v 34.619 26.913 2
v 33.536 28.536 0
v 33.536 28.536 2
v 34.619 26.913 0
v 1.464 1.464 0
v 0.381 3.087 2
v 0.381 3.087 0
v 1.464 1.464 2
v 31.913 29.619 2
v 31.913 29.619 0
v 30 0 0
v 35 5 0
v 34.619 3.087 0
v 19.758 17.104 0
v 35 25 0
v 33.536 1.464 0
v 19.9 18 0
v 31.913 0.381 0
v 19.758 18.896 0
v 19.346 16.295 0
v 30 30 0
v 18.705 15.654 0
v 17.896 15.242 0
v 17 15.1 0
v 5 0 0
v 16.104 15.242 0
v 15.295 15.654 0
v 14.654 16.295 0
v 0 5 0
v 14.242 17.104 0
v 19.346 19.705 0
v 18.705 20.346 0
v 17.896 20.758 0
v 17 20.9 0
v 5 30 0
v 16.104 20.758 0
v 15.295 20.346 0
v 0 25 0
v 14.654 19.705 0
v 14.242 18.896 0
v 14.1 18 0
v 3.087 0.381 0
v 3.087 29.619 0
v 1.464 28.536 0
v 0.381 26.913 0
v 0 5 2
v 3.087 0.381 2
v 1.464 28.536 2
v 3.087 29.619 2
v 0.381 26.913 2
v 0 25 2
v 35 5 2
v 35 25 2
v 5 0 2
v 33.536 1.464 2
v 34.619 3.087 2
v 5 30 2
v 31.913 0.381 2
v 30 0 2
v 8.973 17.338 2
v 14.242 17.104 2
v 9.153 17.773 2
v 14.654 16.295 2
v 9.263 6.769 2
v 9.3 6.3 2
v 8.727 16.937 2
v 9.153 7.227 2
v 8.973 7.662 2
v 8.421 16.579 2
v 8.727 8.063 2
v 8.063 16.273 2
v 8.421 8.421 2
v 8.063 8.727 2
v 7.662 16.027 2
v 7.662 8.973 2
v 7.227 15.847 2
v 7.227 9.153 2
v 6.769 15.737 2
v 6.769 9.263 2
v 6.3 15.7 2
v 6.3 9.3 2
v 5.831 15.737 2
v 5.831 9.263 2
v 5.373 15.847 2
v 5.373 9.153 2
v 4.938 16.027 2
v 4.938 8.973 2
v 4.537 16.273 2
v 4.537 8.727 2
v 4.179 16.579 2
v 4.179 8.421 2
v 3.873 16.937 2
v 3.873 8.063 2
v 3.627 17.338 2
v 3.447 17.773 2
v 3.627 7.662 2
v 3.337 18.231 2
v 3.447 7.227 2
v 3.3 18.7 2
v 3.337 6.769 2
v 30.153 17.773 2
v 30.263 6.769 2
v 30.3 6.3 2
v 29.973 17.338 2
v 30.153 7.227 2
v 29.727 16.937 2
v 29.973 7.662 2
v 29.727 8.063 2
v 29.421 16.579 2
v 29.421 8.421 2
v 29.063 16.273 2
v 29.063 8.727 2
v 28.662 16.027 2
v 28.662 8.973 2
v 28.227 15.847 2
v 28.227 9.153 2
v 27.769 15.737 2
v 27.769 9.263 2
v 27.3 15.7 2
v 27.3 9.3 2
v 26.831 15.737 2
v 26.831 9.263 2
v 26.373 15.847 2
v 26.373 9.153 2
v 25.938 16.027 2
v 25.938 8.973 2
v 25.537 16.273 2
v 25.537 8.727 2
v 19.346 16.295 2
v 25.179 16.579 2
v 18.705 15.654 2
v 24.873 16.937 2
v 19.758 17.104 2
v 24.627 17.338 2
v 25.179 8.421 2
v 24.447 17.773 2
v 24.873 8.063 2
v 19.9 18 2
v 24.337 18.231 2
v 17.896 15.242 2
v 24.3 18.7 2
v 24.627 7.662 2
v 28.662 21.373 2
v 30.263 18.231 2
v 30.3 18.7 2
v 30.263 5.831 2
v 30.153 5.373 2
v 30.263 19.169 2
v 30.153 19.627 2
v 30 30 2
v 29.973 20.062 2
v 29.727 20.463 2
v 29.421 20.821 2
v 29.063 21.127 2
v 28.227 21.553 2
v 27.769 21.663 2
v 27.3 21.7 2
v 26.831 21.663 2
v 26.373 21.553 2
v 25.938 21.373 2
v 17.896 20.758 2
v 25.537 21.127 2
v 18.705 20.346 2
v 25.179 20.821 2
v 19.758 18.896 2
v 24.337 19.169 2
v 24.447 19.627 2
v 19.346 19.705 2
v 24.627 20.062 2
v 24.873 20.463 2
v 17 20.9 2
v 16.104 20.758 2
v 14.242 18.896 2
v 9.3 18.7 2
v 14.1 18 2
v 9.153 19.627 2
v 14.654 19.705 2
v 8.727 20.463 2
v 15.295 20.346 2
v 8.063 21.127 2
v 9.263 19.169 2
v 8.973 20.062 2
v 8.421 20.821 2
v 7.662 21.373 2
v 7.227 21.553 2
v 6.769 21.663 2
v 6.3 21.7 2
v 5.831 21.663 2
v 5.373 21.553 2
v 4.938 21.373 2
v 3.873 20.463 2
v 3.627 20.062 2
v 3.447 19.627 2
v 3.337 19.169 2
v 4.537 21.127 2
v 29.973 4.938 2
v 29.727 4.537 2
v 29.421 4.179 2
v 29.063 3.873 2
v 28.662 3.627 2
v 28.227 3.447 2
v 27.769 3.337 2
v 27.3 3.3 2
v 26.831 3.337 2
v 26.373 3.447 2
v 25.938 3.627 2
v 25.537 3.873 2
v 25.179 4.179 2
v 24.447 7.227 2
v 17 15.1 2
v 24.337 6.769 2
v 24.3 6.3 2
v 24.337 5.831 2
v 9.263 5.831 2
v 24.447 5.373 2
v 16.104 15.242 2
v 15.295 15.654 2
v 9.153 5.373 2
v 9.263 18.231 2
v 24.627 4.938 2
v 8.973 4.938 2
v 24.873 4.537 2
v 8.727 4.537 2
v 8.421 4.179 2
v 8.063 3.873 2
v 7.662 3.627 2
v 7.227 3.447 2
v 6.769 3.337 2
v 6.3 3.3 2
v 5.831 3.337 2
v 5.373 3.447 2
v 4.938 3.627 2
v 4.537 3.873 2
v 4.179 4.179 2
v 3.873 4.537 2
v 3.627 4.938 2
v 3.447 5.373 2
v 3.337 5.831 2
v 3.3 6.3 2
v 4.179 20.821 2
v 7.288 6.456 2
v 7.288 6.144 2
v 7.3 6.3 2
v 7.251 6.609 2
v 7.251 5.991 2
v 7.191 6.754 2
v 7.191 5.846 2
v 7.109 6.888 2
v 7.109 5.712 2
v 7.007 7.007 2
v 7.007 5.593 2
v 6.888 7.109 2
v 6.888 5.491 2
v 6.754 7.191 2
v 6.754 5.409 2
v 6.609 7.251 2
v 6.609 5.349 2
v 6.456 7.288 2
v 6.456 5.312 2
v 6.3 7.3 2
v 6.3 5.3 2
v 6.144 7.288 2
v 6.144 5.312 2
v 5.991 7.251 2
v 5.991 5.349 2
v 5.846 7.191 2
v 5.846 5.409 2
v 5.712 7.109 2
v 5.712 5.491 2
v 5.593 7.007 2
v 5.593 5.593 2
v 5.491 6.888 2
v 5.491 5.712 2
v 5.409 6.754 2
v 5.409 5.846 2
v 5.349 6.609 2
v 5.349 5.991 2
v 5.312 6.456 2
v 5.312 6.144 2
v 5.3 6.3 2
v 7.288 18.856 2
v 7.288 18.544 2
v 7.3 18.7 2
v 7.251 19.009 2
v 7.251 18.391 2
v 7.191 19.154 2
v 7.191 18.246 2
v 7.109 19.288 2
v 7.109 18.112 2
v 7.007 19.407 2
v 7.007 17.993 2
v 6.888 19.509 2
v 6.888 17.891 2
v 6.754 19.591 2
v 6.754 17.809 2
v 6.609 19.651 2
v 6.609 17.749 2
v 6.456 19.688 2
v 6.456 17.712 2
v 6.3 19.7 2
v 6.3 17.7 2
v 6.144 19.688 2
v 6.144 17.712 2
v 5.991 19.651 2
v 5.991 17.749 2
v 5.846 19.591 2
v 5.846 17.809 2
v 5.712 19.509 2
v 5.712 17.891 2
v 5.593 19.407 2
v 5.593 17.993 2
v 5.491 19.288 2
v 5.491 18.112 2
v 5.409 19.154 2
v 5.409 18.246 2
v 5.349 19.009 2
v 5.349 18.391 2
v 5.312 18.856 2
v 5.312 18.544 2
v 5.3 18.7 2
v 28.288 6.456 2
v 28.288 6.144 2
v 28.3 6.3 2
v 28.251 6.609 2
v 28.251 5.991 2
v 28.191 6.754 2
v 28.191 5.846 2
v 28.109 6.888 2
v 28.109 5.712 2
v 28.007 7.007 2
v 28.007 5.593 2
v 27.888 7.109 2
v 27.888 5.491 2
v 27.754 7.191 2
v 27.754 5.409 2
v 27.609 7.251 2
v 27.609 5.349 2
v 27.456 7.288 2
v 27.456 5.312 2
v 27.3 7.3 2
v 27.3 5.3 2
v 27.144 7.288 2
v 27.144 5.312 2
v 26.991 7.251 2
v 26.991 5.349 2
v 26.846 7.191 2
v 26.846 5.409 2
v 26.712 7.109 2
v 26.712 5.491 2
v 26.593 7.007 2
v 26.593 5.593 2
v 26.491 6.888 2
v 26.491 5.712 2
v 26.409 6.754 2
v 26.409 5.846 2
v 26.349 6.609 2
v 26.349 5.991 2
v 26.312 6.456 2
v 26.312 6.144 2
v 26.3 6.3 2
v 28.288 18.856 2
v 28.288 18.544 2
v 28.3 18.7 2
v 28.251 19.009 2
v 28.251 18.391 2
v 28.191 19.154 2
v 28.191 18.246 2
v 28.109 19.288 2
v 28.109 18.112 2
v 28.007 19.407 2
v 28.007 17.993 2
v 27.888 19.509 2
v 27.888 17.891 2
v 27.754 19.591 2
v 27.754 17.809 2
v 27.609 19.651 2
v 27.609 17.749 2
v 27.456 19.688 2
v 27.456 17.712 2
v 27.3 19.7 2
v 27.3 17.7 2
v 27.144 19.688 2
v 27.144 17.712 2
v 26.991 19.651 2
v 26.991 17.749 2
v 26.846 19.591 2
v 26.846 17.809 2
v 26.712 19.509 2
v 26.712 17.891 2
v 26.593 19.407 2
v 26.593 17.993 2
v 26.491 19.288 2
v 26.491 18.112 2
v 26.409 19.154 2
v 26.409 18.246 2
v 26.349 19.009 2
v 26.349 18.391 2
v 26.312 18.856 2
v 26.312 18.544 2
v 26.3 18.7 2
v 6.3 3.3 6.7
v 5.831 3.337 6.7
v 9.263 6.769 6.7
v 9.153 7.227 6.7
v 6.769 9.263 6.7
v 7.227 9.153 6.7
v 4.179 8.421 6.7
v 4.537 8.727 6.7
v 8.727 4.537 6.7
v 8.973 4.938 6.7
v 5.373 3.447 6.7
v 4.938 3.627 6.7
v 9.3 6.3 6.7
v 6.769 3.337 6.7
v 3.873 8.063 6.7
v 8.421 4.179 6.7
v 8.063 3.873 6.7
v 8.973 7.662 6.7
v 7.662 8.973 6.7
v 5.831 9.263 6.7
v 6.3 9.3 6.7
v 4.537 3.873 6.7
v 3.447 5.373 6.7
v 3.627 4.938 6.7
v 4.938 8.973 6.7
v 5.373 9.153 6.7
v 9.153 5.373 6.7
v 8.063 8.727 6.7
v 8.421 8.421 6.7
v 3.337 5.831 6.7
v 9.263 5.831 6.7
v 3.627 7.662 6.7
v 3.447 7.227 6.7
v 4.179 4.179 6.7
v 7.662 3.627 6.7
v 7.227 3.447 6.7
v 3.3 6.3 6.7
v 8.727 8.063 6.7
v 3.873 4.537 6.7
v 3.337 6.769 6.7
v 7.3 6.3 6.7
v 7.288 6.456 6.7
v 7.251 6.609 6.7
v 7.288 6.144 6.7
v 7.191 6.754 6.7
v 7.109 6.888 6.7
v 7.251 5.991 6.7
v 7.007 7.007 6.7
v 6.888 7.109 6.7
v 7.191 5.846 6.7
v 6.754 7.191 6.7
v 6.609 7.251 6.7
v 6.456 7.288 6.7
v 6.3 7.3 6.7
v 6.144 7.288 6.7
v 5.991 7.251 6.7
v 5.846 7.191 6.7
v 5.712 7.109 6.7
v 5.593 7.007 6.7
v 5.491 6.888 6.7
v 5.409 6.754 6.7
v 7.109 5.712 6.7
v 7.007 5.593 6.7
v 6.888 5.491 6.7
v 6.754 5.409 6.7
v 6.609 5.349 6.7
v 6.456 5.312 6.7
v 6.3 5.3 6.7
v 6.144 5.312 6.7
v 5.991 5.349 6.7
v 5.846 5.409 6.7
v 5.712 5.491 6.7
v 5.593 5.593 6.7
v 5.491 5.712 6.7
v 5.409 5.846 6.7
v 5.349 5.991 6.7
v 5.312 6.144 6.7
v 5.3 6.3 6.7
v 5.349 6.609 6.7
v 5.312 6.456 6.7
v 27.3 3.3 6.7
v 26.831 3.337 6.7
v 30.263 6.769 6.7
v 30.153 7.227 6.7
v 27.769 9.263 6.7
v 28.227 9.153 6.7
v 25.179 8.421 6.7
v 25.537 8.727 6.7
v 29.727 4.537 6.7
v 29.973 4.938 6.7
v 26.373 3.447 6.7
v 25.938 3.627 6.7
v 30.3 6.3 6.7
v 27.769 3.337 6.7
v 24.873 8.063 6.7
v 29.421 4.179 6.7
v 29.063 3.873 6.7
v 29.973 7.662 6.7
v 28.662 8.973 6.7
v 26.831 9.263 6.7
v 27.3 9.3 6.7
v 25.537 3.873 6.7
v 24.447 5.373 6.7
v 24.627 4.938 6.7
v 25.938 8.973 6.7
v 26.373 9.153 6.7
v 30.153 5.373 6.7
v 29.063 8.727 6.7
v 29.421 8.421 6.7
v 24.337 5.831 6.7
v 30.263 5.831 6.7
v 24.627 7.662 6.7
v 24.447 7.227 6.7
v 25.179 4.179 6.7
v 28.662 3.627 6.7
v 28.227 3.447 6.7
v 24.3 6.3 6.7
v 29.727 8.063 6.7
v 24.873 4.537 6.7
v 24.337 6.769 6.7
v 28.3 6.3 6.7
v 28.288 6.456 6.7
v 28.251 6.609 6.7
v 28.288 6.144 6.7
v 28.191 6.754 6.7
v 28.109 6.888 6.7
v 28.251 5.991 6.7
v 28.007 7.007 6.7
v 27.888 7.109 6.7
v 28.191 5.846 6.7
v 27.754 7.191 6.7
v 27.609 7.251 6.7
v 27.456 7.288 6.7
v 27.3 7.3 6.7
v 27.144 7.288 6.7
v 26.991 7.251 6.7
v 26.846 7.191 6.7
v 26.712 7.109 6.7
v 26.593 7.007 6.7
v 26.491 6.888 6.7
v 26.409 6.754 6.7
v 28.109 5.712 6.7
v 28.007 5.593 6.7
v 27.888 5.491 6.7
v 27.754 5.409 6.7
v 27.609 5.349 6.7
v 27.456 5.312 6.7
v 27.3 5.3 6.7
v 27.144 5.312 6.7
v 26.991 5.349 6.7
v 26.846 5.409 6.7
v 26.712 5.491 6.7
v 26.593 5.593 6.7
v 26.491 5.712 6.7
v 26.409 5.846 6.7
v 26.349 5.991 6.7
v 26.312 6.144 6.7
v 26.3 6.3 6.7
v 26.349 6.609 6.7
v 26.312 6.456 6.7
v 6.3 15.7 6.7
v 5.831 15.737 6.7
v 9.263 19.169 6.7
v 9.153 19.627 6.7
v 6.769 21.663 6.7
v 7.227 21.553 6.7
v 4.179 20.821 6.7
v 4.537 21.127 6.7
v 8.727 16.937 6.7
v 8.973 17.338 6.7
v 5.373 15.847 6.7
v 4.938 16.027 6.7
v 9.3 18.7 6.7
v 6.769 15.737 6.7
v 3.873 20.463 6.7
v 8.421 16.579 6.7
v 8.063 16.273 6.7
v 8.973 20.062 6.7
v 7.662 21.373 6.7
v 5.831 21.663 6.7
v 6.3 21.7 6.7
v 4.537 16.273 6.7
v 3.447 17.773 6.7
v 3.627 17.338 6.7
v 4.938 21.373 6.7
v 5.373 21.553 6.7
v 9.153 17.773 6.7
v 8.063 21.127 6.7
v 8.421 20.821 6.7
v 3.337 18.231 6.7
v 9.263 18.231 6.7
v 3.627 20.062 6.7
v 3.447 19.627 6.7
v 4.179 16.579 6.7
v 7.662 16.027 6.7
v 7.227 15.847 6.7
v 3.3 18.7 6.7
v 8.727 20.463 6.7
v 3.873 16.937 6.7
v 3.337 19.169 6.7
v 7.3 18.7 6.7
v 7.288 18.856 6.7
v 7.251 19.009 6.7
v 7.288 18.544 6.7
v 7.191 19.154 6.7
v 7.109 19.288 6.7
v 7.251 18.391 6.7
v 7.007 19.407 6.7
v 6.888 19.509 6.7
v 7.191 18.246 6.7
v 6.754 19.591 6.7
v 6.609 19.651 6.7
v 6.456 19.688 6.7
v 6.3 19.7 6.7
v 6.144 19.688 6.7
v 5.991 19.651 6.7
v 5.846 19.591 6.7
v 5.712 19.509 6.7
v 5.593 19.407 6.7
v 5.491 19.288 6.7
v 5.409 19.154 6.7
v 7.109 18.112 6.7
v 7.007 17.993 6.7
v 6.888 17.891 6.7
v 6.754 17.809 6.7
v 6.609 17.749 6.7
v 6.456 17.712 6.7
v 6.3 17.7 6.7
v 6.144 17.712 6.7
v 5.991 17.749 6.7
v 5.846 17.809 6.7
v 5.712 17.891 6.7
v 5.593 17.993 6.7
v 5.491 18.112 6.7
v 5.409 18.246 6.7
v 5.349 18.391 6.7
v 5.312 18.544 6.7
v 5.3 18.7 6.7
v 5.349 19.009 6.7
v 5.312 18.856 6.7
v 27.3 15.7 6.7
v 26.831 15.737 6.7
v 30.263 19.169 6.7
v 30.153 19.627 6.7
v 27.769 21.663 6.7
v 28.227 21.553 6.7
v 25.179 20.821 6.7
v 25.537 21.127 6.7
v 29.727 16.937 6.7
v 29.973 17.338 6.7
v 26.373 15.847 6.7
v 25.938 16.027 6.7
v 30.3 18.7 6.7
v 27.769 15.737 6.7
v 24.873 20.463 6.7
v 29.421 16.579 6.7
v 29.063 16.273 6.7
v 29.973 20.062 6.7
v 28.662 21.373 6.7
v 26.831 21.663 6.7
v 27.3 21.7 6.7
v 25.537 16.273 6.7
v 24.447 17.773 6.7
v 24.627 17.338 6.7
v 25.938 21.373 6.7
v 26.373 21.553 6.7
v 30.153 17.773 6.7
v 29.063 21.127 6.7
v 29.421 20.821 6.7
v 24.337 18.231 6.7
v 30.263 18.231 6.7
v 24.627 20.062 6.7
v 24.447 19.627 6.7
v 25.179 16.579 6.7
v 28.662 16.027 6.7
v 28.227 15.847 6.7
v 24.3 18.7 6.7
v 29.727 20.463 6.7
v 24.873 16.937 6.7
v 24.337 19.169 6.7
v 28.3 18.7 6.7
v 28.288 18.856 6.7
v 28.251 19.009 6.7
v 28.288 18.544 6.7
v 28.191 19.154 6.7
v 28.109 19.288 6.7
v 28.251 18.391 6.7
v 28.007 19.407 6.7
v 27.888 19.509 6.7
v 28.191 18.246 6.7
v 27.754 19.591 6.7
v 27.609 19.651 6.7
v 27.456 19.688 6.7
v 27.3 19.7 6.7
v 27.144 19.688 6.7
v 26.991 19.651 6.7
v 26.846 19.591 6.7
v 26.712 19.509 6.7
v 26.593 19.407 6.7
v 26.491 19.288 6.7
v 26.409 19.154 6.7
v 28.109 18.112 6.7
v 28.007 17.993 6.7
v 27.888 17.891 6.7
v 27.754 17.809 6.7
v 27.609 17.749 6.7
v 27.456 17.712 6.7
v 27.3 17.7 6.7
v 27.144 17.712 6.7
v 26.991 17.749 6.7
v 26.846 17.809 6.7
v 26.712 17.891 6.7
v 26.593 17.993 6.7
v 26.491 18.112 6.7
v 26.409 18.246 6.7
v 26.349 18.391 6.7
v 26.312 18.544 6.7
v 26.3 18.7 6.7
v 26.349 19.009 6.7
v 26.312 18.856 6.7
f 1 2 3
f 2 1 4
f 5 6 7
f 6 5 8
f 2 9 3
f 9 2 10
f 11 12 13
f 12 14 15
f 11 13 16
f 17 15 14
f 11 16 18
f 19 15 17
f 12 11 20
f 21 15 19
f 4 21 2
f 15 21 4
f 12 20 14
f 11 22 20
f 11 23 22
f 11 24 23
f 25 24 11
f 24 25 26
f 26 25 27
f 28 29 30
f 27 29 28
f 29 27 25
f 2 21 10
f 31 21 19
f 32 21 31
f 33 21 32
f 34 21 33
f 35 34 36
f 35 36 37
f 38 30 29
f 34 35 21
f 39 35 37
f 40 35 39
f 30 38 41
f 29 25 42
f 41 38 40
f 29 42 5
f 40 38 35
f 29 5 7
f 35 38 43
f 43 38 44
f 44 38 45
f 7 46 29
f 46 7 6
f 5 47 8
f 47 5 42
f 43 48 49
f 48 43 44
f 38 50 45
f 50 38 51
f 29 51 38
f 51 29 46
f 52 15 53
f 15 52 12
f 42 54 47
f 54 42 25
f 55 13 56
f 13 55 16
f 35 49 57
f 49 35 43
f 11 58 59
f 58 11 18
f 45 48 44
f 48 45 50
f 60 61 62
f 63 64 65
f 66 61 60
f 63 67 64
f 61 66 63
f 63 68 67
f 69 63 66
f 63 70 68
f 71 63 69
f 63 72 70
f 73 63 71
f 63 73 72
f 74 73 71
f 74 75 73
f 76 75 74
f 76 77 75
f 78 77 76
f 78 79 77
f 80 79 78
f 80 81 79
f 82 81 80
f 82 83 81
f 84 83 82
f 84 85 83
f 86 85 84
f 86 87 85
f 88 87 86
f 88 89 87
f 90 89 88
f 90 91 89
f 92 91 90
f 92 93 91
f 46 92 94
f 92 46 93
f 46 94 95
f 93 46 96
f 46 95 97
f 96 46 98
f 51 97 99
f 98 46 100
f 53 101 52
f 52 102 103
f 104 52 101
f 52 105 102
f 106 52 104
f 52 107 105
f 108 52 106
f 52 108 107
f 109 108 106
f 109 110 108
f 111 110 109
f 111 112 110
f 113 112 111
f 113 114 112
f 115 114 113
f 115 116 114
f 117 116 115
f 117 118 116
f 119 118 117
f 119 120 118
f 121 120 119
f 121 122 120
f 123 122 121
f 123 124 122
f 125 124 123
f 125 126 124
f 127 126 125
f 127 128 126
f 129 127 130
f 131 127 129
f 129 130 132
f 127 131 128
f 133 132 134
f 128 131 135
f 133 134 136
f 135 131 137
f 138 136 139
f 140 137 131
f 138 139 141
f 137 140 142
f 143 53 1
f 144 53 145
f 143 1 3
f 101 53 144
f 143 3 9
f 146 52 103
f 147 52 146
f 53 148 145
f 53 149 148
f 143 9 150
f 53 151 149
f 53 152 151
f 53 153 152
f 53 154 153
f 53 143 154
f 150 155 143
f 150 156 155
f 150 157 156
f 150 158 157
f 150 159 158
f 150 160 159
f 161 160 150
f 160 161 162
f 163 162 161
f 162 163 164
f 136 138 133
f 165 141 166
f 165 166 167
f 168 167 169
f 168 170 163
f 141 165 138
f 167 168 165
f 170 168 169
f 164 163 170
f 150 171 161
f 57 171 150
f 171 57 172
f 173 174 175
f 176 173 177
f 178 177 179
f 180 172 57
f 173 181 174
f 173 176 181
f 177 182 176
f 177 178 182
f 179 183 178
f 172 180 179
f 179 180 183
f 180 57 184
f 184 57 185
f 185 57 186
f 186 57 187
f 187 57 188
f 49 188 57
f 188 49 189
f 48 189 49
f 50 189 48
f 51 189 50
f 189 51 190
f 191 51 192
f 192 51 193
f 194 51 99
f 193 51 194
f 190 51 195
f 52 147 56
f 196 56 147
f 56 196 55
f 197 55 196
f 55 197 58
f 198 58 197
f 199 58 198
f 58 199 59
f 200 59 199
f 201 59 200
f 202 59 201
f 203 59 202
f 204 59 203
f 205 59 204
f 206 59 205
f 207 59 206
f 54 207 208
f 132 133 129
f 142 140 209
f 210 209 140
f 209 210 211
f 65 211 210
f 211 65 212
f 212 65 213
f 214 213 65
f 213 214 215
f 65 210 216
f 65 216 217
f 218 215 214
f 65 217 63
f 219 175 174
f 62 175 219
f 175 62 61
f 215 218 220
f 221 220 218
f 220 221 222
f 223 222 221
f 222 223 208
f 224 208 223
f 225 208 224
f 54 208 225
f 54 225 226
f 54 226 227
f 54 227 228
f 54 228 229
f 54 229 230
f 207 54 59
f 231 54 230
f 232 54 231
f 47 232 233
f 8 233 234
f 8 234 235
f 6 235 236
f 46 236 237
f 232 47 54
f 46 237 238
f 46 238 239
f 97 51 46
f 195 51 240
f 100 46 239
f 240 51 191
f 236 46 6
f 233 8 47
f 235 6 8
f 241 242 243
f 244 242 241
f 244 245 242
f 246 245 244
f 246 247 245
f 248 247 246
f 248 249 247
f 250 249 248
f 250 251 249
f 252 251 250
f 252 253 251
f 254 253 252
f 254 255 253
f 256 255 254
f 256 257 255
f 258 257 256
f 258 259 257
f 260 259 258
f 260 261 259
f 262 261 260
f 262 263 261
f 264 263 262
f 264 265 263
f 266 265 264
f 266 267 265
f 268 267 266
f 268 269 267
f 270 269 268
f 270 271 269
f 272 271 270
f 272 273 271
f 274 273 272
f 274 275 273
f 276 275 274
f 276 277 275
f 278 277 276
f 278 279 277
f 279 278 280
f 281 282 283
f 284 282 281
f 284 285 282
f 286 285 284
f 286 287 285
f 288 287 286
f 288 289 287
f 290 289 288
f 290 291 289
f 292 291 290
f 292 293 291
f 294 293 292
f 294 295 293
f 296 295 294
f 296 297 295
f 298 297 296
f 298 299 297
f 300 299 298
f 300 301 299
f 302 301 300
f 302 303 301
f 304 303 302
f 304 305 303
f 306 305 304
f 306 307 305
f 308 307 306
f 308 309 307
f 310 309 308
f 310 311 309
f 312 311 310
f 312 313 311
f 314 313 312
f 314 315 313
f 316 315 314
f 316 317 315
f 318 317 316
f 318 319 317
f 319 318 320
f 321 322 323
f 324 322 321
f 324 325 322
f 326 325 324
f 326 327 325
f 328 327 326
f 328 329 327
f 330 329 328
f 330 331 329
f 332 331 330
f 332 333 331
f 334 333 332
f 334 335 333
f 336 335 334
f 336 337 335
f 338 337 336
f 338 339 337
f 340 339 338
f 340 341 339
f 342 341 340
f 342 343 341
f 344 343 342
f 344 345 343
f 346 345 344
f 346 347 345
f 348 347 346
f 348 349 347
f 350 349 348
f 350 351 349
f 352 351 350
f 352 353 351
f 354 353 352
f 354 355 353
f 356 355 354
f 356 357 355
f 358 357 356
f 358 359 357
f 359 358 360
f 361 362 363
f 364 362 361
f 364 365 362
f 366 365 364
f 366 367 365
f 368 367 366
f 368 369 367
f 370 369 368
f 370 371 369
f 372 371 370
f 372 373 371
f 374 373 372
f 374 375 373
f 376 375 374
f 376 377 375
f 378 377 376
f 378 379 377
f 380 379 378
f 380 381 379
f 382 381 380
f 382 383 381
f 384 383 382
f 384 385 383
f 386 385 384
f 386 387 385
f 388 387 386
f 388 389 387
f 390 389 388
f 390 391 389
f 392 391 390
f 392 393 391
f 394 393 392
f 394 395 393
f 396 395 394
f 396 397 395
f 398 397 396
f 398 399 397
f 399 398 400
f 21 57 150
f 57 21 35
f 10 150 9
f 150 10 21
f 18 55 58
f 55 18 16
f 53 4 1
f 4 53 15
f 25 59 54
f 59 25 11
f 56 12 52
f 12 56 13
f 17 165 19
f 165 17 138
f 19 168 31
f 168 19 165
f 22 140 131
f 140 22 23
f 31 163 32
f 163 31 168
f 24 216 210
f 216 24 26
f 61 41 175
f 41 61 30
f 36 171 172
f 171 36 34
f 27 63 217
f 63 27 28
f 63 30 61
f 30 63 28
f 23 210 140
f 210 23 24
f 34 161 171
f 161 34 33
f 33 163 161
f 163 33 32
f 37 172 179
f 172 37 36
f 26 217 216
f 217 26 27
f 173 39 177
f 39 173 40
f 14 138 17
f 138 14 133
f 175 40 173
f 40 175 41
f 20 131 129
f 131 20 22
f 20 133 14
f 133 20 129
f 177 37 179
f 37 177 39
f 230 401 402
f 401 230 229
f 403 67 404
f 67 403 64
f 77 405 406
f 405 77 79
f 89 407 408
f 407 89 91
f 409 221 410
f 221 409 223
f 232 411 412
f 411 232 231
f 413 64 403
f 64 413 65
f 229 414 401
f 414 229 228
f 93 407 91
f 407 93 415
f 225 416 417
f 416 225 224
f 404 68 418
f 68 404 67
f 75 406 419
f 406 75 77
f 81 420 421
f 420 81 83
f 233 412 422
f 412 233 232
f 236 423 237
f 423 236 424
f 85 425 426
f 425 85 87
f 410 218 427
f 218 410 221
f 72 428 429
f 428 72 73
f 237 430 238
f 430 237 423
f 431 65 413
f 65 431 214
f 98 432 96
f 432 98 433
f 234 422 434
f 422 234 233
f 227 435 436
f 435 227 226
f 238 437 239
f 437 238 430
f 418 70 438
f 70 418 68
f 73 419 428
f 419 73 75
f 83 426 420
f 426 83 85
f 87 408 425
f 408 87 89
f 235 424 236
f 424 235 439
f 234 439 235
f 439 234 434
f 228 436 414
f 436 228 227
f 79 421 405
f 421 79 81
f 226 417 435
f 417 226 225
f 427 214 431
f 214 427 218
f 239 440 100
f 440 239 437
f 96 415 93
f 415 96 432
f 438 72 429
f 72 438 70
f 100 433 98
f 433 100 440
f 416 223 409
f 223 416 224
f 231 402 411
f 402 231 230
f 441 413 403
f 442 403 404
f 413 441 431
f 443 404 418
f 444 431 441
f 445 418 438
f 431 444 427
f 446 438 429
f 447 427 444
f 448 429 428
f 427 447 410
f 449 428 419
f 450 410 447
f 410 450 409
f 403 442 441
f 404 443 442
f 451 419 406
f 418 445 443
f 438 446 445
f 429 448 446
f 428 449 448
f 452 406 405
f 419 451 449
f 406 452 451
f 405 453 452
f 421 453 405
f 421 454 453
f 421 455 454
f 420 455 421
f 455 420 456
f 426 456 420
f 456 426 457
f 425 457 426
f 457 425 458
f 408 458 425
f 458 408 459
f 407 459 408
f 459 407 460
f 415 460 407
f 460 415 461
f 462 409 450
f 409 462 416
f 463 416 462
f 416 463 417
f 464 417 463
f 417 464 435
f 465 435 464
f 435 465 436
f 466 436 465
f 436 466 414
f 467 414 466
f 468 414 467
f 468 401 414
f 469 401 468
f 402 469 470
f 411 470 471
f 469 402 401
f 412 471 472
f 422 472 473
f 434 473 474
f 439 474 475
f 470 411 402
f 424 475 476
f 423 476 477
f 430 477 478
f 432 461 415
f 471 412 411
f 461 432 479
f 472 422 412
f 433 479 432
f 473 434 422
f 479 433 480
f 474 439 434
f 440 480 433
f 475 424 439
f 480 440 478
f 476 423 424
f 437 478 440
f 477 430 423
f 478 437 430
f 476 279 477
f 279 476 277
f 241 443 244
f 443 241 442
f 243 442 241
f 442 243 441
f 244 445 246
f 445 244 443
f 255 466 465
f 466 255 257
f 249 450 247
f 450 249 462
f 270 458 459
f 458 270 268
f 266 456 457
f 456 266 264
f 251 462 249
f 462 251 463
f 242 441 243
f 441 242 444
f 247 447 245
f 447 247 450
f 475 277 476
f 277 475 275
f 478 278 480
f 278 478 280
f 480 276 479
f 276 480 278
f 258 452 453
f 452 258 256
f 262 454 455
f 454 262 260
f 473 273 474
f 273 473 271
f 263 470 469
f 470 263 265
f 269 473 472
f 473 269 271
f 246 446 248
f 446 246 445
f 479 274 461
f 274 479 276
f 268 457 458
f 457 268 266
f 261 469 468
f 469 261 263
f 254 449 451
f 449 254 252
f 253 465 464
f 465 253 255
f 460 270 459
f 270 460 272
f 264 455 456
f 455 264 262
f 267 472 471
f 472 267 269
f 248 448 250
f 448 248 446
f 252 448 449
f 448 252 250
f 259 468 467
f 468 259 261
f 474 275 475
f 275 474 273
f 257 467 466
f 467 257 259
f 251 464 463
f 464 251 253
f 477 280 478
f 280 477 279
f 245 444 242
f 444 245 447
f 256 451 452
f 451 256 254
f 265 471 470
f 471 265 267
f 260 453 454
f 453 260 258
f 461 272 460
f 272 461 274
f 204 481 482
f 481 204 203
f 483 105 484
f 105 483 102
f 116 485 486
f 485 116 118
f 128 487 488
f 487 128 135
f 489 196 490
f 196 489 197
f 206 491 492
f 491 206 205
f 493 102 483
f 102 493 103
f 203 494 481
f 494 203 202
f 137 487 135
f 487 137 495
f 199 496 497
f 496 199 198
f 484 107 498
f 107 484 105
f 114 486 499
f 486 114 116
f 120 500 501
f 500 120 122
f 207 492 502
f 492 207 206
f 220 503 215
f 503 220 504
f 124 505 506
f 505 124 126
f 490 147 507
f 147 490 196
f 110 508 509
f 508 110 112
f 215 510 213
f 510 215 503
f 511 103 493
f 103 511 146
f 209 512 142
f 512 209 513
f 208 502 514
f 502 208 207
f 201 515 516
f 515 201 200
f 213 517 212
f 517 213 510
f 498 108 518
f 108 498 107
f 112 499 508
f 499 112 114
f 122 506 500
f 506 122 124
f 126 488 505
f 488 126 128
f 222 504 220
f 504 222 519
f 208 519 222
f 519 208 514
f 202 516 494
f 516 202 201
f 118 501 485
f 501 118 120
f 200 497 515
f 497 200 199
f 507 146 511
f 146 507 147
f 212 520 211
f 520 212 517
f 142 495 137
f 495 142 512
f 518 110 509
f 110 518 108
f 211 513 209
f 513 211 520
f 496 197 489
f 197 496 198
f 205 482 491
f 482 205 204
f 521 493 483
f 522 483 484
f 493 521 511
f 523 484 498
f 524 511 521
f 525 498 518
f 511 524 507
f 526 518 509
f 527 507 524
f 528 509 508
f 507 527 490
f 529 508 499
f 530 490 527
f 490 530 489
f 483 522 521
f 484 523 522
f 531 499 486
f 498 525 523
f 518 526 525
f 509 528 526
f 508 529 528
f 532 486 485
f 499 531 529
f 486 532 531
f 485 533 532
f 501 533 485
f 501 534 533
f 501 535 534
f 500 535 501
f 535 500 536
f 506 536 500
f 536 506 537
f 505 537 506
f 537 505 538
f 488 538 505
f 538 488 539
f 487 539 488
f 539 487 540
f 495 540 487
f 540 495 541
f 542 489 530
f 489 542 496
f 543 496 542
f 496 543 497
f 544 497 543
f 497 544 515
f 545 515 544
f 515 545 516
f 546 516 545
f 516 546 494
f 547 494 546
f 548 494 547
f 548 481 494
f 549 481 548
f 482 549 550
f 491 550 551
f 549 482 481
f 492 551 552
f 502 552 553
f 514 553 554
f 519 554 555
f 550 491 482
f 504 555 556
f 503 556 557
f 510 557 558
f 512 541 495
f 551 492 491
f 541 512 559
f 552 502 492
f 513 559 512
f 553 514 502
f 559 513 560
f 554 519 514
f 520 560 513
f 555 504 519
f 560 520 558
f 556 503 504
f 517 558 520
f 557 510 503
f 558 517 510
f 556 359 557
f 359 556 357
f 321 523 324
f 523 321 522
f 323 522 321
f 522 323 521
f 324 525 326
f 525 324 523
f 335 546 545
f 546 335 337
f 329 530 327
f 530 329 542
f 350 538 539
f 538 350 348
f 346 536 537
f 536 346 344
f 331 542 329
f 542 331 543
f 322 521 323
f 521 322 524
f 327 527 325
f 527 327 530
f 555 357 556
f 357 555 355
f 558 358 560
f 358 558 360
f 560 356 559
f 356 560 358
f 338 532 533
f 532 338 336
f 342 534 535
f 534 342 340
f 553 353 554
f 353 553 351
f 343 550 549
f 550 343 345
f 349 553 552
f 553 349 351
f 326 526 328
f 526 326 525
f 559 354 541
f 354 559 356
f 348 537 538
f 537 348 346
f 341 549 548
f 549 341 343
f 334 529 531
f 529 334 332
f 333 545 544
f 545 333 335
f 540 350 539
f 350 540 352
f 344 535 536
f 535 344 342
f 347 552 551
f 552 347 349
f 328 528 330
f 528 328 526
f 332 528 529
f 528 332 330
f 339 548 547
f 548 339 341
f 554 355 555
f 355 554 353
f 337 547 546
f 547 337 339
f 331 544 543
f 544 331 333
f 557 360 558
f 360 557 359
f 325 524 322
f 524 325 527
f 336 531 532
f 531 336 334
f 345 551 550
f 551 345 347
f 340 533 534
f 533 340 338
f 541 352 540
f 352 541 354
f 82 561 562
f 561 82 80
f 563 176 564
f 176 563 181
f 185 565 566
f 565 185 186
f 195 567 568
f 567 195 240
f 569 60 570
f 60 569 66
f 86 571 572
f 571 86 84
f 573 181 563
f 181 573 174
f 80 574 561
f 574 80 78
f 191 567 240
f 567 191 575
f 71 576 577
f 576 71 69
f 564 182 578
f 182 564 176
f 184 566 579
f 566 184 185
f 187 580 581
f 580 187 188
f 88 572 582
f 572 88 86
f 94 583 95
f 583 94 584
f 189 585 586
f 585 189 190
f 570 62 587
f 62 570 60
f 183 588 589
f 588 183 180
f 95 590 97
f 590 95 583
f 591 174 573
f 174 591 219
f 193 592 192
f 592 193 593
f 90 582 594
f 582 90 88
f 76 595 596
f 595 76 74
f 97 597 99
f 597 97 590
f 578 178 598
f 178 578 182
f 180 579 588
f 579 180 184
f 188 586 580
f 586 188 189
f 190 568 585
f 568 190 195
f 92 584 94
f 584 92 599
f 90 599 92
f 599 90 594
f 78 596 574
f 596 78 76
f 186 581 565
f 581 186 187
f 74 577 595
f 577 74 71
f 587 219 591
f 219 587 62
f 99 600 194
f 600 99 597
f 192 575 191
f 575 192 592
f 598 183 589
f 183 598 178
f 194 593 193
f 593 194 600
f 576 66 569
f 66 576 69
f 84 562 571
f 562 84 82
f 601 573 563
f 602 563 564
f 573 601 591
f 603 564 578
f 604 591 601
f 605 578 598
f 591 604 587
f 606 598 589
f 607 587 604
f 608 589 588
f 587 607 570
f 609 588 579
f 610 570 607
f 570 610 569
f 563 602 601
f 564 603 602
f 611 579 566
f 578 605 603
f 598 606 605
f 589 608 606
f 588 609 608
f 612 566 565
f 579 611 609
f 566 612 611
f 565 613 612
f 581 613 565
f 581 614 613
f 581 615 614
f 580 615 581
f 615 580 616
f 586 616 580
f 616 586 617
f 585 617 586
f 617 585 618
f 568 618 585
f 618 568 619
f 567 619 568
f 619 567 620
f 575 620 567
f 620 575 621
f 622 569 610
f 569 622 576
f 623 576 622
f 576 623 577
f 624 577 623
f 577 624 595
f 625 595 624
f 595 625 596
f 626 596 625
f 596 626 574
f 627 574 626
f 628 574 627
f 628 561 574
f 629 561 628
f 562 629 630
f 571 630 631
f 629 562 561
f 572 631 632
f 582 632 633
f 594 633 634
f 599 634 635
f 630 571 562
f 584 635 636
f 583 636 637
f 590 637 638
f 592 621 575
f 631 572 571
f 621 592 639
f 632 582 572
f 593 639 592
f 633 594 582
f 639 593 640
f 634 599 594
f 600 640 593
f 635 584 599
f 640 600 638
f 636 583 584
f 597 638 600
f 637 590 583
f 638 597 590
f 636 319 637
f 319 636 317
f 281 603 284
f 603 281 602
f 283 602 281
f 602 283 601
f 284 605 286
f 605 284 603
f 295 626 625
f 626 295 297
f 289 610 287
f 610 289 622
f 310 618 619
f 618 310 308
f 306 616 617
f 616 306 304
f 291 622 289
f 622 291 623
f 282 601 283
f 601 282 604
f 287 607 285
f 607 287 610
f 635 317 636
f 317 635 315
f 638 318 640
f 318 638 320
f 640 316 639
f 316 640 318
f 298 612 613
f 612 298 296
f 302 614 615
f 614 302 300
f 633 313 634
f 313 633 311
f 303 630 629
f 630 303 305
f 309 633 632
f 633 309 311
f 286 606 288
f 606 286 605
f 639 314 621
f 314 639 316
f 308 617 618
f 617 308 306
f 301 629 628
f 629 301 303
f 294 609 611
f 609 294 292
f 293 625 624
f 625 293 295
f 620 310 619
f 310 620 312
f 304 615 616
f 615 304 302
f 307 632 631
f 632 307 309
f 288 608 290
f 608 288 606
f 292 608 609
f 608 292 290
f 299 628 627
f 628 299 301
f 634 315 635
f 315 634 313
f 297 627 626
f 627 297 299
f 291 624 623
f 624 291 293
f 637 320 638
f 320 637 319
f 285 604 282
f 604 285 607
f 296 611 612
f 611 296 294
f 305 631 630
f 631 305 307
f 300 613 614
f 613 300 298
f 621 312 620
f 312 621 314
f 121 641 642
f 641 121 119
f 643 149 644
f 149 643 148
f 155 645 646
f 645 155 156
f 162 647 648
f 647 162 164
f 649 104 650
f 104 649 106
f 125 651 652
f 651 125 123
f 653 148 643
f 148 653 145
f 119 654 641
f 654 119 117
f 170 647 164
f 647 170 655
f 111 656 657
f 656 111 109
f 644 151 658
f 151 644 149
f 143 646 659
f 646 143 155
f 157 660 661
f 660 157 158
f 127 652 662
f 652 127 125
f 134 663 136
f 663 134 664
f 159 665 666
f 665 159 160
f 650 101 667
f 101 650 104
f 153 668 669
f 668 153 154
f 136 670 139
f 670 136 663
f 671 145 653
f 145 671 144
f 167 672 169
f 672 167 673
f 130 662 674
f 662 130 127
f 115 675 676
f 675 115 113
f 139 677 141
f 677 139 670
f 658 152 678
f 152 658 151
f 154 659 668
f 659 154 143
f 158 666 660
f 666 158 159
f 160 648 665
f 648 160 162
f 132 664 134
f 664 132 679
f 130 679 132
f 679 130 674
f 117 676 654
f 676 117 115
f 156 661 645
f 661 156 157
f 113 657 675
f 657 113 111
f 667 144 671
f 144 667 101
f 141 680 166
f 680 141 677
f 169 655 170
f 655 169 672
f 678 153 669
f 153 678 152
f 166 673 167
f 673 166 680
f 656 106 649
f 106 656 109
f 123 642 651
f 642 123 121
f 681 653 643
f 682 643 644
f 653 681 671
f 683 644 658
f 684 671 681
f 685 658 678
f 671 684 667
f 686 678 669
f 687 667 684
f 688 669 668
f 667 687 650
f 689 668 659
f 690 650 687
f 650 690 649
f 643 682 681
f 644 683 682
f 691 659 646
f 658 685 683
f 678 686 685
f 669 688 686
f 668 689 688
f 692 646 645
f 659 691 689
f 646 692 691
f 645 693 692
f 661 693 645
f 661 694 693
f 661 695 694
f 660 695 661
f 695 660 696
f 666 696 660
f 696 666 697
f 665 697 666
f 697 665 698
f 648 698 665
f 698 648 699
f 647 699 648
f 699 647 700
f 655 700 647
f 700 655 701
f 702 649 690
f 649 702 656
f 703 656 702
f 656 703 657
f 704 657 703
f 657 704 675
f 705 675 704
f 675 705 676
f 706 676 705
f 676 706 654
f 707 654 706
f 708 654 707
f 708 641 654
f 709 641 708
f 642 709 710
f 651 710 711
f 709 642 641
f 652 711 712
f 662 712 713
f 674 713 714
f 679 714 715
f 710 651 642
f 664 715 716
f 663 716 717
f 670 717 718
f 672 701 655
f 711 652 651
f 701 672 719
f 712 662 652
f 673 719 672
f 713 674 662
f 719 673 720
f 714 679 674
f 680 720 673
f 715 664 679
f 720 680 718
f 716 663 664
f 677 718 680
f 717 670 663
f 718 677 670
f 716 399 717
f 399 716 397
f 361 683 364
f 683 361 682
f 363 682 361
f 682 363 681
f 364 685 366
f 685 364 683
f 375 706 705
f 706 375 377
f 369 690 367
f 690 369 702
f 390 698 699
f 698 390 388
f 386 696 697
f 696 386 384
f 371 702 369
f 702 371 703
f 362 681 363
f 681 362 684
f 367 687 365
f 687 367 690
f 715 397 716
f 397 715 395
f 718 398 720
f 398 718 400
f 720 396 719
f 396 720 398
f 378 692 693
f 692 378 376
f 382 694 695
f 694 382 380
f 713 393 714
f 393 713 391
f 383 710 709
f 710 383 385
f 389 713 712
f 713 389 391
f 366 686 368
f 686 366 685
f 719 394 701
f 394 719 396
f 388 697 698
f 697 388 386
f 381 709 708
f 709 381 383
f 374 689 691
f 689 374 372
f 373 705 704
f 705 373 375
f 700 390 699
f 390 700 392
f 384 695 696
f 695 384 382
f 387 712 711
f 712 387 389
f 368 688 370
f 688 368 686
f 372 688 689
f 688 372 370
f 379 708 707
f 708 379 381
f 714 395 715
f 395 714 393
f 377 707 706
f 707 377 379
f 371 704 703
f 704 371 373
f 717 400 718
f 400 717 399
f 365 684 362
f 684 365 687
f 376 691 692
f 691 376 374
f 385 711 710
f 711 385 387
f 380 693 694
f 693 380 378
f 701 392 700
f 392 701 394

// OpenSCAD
// file: params.scad
module roundedRect(size, radius)
    {
    x = size[0];
    y = size[1];
    z = size[2];

    linear_extrude(height=z)
    hull()
    {
        // place 4 circles in the corners, with the given radius
        translate([radius, radius, 0])
        circle(r=radius);

        translate([x - radius, radius, 0])
        circle(r=radius);

        translate([radius, y - radius, 0])
        circle(r=radius);

        translate([x - radius, y - radius, 0])
        circle(r=radius);
    }
}

module roundedPoly(size, radius)
{
	x = size[0];
	y = size[1];
	z = size[2];

	hull()
	{
		// place 4 circles in the bottom corners, with the given radius
		translate([radius, radius, radius])
		sphere(r=radius);
	
		translate([x - radius, radius, radius])
		sphere(r=radius);
	
		translate([radius, y - radius, radius])
		sphere(r=radius);
	
		translate([x - radius, y - radius, radius])
		sphere(r=radius);
        
        // place 4 circles in the top corners, with the given radius
		translate([radius, radius, z - radius])
		sphere(r=radius);
	
		translate([x - radius, radius, z - radius])
		sphere(r=radius);
	
		translate([radius, y - radius, z - radius])
		sphere(r=radius);
	
		translate([x - radius, y - radius, z - radius])
		sphere(r=radius);
	}
}

module standoff(radius, height, inner_radius, depth=10) {
    difference() {
        cylinder(h=height, r=radius, $fn=40);
        translate([0, 0, height-20]) {
            cylinder(h=20.1, r=inner_radius, $fn=40);
        }
    }
}
    

left_margin = 10;
right_margin = 40;
top_margin = 25;
bottom_margin = 12;
screen_width = 118.1;
screen_height = 70.9;
height = 2;

total_width = left_margin+right_margin+screen_width;
total_height = top_margin+bottom_margin+screen_height;

ribbon_cable_width=13;

wall_thickness = 2;
depth = 45;
standoff_od = 4;

camera_offset_x = 100;
camera_offset_y = 12;
camera_standoff_height = 4.7;

sensor_offset_x = 135;
sensor_offset_y = 15;
// main file
include <params.scad>

camera_offset_x = 5;
camera_offset_y = 5;

difference() {
        roundedRect([35, 30, height], 5);
    
    translate([camera_offset_x+12, camera_offset_y+13, -0.1]) {
        cylinder(h=height + 0.2, r=2.9, $fn=20);
    }
}


translate([camera_offset_x, camera_offset_y, height]) {

    translate([1.3, 1.3, 0]) {
        standoff(3, camera_standoff_height, 1, depth=4.5);
    }

    translate([21+1.3, 1.3, 0]) {
        standoff(3, camera_standoff_height, 1, depth=4.5);
    }

    translate([1.3, 12.4+1.3, 0]) {
        standoff(3, camera_standoff_height, 1, depth=4.5);
    }

    translate([21+1.3, 12.4+1.3, 0]) {
        standoff(3, camera_standoff_height, 1, depth=4.5);
    }

}
